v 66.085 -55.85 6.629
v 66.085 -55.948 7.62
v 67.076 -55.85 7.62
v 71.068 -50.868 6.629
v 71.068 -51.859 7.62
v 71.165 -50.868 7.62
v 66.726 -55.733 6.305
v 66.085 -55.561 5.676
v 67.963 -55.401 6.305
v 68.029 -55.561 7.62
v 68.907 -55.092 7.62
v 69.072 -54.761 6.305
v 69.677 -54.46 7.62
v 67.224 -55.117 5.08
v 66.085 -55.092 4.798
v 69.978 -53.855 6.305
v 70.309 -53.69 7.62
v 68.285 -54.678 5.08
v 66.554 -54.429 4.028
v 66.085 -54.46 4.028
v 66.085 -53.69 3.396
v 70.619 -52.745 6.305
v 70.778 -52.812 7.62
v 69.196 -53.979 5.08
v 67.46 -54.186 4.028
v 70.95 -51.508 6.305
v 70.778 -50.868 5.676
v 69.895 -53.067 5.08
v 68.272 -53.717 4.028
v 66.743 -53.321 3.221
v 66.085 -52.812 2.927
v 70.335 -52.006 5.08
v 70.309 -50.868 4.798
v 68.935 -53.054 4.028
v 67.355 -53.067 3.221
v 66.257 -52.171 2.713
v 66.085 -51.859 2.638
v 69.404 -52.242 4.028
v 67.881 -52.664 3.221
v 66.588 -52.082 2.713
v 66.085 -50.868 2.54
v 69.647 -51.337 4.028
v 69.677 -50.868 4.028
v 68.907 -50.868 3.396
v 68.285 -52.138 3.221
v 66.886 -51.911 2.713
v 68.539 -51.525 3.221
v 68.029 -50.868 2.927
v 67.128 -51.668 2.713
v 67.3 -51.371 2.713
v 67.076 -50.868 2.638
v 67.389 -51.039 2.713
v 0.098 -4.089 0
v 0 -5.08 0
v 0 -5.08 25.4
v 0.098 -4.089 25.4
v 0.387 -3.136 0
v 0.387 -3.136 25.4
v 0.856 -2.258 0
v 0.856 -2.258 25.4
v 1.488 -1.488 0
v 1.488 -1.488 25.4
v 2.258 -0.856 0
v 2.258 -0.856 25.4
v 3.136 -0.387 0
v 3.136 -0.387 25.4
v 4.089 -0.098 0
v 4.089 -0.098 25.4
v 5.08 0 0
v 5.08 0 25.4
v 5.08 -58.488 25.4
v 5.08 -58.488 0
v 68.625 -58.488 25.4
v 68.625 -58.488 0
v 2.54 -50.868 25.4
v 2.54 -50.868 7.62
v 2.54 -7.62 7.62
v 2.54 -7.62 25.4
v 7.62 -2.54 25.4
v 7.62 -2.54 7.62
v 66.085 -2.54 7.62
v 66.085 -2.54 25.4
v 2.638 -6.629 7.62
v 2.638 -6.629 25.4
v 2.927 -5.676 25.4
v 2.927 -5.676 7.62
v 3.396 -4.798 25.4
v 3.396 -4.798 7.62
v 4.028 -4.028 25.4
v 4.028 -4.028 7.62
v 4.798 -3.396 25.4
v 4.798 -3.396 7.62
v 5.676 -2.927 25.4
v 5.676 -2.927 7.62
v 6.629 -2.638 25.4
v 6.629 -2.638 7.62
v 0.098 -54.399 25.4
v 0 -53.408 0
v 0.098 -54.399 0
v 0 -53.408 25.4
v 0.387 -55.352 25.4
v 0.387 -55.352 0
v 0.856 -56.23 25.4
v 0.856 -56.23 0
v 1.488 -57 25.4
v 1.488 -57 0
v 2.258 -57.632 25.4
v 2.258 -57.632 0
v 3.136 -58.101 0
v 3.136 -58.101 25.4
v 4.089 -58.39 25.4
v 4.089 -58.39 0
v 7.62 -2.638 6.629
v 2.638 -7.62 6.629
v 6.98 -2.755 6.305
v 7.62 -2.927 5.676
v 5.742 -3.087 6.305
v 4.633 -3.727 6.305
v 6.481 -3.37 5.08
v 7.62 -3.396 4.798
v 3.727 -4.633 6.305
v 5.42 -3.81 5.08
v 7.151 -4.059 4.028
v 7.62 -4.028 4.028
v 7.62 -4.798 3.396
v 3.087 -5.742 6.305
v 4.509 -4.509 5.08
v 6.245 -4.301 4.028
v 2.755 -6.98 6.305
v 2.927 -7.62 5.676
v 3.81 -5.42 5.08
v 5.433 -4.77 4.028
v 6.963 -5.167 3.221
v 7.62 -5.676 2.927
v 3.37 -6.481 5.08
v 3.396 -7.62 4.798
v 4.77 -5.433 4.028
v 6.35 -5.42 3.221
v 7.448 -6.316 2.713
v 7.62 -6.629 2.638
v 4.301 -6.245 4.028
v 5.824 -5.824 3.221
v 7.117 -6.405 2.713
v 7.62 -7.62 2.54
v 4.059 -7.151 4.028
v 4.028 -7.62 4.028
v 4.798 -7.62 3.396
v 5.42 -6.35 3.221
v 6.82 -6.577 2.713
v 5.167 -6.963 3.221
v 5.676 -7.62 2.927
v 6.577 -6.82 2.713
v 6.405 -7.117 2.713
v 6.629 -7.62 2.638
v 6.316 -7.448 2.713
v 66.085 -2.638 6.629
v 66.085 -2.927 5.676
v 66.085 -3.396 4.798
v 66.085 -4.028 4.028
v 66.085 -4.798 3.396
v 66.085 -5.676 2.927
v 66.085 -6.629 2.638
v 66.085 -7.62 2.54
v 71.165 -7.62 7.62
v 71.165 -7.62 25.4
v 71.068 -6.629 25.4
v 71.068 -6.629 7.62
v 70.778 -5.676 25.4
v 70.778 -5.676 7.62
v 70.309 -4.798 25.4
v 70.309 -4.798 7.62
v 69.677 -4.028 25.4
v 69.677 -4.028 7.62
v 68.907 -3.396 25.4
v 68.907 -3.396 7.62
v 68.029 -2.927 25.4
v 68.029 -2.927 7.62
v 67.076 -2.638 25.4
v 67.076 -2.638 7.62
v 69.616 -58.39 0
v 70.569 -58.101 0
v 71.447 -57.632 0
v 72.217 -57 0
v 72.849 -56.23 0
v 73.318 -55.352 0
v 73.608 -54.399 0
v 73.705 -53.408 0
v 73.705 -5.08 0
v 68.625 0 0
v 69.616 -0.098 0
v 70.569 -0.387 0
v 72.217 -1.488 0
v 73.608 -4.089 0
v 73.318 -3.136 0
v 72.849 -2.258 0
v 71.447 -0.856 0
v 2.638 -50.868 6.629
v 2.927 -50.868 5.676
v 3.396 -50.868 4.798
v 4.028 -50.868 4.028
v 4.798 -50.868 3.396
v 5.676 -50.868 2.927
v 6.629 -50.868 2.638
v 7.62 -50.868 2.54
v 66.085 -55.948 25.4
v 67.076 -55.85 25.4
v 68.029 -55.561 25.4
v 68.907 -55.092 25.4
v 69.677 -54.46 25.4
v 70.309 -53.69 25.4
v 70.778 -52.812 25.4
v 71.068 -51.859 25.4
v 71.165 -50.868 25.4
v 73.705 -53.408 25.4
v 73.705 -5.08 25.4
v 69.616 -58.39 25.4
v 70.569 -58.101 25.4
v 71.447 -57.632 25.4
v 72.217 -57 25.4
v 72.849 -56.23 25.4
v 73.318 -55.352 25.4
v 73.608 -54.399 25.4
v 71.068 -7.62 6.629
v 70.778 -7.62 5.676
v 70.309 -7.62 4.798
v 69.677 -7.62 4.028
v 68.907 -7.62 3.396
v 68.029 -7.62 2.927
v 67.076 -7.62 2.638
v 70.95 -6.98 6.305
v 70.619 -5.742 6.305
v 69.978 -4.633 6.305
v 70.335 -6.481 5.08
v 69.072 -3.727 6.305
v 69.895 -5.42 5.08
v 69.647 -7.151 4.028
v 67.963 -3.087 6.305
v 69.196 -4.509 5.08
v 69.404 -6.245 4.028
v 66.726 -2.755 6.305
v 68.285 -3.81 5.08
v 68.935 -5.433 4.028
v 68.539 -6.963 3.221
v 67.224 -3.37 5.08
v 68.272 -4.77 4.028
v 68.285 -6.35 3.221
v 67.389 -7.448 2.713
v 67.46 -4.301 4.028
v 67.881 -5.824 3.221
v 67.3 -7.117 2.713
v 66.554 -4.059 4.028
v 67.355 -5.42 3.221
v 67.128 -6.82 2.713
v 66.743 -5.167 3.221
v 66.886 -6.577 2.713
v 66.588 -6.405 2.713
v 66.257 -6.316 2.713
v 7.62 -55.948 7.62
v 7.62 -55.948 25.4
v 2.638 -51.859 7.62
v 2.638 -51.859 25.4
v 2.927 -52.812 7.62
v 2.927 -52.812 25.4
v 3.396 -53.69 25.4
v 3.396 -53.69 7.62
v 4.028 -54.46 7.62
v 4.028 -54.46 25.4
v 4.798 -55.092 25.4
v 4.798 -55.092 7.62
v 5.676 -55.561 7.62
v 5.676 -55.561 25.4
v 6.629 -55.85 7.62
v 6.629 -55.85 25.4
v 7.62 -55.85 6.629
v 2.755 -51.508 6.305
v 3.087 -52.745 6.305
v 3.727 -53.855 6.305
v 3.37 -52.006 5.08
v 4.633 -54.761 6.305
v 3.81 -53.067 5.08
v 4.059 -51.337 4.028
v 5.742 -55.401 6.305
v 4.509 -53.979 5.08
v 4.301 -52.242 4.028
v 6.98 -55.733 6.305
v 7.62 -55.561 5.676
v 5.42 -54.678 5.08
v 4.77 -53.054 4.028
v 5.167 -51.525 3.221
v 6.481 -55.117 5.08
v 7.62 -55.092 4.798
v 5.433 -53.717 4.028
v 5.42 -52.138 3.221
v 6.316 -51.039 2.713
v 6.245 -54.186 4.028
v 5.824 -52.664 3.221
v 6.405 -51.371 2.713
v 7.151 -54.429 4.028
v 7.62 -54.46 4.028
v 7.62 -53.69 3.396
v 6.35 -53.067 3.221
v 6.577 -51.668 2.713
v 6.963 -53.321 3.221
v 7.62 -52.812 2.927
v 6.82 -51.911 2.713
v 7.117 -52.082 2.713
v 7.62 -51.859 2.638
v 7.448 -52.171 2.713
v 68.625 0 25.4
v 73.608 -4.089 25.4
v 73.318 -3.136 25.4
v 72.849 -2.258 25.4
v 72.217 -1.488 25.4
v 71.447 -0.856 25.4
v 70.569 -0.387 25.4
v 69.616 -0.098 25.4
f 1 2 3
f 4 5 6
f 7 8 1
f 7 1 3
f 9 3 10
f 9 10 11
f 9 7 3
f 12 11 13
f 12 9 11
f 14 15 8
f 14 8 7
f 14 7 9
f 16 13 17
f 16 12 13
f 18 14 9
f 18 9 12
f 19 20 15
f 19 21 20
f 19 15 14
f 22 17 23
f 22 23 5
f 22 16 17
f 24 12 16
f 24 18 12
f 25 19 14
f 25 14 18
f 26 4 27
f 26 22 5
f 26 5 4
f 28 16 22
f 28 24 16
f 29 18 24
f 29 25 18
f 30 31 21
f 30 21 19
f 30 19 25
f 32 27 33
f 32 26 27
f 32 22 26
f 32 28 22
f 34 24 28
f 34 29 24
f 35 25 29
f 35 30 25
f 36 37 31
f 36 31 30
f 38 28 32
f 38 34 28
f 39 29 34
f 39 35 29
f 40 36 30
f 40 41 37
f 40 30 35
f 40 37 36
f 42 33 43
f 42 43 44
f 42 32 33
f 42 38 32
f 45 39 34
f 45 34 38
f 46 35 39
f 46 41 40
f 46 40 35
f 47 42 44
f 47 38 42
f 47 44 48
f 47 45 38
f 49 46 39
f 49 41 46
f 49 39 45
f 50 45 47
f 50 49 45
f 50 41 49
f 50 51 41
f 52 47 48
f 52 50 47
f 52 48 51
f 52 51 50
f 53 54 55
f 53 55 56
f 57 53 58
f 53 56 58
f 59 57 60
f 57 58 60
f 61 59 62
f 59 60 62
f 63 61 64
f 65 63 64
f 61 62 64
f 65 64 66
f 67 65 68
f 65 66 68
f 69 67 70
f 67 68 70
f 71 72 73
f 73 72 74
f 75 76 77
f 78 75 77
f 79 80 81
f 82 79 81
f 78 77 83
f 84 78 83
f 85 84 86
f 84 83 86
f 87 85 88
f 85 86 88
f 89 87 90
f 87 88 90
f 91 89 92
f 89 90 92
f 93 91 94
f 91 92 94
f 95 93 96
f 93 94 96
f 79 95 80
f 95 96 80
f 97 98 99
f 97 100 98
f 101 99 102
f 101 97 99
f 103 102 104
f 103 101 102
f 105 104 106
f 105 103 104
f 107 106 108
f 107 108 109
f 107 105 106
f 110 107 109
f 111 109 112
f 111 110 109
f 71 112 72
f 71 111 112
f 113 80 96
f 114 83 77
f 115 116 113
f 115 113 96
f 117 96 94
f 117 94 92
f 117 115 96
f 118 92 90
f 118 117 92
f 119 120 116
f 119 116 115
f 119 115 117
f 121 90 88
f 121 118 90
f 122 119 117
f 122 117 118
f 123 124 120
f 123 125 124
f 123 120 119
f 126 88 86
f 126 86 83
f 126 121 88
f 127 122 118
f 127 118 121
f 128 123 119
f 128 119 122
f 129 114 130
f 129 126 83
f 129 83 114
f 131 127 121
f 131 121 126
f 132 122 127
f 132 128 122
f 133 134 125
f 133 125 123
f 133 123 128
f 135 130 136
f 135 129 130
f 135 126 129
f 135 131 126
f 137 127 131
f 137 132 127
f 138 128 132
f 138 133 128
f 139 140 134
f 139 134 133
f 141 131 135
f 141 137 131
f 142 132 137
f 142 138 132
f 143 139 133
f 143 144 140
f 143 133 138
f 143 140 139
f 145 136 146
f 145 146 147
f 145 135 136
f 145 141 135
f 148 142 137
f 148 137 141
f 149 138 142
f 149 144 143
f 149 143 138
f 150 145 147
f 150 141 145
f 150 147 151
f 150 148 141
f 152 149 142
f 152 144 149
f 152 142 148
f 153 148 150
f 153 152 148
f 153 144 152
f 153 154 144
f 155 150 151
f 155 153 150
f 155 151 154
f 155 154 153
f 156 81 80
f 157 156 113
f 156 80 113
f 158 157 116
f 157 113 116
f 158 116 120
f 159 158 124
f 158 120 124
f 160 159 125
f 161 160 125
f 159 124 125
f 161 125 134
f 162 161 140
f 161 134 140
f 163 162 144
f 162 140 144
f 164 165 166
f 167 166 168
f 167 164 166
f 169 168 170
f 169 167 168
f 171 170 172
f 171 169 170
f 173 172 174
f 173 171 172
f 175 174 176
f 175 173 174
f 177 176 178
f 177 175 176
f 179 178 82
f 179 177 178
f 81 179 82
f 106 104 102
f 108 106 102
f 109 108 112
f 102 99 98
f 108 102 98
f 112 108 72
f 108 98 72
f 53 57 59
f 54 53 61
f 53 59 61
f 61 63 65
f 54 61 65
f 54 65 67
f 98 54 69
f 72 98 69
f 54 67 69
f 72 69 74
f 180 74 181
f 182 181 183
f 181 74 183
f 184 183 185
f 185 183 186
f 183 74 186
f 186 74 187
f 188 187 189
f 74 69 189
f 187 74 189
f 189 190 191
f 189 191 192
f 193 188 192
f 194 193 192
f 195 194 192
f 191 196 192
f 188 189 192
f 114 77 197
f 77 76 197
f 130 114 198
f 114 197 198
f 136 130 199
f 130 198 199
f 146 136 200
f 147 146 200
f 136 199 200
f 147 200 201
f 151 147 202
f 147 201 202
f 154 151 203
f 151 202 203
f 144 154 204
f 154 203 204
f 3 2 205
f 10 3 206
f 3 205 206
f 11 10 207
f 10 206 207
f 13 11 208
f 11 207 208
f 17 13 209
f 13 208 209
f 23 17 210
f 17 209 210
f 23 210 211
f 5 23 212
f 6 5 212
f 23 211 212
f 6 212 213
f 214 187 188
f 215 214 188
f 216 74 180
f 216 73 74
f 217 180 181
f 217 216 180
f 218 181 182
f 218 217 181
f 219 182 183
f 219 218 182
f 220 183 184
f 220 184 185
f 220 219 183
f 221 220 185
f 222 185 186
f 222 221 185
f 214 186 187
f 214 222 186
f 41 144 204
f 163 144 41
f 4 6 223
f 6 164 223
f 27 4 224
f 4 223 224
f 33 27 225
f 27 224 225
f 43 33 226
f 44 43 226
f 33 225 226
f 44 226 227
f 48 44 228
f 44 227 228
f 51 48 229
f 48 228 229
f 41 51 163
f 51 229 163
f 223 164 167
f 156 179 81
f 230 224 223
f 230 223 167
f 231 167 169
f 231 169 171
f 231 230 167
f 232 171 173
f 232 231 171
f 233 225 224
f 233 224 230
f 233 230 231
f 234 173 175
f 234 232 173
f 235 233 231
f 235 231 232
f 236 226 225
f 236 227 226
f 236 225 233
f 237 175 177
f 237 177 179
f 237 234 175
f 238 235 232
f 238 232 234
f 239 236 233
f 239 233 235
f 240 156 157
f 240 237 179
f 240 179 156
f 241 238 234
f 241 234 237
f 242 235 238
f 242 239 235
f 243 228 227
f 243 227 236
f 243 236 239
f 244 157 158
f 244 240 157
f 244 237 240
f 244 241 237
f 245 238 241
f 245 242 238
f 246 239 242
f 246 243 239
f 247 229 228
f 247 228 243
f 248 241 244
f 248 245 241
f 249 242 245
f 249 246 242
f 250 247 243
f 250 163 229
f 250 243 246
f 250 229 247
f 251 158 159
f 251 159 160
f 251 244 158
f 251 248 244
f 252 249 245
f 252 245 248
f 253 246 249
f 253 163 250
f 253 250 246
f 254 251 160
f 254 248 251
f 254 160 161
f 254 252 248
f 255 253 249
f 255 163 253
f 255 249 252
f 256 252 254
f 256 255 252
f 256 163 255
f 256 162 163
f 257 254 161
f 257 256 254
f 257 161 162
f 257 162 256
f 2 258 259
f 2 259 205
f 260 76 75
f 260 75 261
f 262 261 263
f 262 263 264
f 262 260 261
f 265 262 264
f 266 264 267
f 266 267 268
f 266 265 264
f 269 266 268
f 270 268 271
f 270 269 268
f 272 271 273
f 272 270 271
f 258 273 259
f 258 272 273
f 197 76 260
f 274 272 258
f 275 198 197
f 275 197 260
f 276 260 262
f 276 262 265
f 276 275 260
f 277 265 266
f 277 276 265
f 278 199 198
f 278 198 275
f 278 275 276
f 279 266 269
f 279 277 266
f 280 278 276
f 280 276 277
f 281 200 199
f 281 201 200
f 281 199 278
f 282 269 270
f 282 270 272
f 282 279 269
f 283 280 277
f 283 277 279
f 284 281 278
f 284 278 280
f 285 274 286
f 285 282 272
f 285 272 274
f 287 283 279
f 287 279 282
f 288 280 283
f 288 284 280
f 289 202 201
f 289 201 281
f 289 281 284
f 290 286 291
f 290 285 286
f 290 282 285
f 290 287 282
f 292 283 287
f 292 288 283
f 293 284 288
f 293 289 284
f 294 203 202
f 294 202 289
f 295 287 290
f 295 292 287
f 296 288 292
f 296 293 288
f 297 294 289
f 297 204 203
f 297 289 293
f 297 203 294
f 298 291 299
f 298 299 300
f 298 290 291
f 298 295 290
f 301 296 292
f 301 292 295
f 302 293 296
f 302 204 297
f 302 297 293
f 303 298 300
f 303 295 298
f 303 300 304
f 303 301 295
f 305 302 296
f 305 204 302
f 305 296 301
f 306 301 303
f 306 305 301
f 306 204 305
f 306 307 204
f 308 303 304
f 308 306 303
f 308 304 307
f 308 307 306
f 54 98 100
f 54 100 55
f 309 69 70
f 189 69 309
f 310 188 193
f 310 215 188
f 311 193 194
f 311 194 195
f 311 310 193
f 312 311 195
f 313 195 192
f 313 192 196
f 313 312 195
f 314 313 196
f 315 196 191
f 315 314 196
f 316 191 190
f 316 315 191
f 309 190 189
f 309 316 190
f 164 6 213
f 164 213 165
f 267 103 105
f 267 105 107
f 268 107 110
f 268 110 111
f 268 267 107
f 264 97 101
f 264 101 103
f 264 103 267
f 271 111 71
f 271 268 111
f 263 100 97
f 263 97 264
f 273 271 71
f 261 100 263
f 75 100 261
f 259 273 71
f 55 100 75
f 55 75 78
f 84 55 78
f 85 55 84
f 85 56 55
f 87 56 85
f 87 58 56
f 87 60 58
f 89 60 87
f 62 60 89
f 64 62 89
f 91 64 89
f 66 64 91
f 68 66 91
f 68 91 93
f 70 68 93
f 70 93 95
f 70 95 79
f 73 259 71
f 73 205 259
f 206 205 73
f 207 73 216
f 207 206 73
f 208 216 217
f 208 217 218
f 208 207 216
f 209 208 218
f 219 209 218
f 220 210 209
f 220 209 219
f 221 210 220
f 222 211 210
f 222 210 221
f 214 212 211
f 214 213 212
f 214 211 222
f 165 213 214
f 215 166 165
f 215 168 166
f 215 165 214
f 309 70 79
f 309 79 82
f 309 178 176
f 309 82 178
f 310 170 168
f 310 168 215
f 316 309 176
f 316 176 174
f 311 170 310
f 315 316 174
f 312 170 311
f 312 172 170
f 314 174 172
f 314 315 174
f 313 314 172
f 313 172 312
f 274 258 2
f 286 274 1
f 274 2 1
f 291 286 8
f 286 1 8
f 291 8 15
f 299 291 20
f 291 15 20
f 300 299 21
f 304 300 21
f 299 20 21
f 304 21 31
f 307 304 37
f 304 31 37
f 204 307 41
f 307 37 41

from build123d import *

# Parameters (mm, degrees)
F0_W     = 73.7051814795
F0_H     = 58.4876872599
F1_DEPTH = 25.4
F2_T     = -2.54
F3_R     = 5.08
F4_R     = 5.08


with BuildPart() as f1:
    # F0 (on Top) → F1 (new body)
    with BuildSketch(Plane.XY):
        with Locations((36.8525907397, -29.24384363)):
            Rectangle(F0_W, F0_H)
    extrude(amount=F1_DEPTH)

    # F2
    f2_openings = [f1.faces().sort_by_distance(p)[0] for p in [
        (36.852591, -29.243844, 25.4),
    ]]
    offset(amount=F2_T, openings=f2_openings)

    # F3
    f3_edges = [f1.edges().sort_by_distance(p)[0] for p in [
        (0, -58.487687, 12.7),
        (0, 0, 12.7),
        (2.54, -55.947687, 13.97),
        (2.54, -2.54, 13.97),
        (73.705181, 0, 12.7),
        (71.165181, -2.54, 13.97),
        (71.165181, -55.947687, 13.97),
        (73.705181, -58.487687, 12.7),
    ]]
    fillet(f3_edges, radius=F3_R)

    # F4
    f4_edges = [f1.edges().sort_by_distance(p)[0] for p in [
        (71.165181, -29.243844, 2.54),
    ]]
    fillet(f4_edges, radius=F4_R)


solid = f1.part
